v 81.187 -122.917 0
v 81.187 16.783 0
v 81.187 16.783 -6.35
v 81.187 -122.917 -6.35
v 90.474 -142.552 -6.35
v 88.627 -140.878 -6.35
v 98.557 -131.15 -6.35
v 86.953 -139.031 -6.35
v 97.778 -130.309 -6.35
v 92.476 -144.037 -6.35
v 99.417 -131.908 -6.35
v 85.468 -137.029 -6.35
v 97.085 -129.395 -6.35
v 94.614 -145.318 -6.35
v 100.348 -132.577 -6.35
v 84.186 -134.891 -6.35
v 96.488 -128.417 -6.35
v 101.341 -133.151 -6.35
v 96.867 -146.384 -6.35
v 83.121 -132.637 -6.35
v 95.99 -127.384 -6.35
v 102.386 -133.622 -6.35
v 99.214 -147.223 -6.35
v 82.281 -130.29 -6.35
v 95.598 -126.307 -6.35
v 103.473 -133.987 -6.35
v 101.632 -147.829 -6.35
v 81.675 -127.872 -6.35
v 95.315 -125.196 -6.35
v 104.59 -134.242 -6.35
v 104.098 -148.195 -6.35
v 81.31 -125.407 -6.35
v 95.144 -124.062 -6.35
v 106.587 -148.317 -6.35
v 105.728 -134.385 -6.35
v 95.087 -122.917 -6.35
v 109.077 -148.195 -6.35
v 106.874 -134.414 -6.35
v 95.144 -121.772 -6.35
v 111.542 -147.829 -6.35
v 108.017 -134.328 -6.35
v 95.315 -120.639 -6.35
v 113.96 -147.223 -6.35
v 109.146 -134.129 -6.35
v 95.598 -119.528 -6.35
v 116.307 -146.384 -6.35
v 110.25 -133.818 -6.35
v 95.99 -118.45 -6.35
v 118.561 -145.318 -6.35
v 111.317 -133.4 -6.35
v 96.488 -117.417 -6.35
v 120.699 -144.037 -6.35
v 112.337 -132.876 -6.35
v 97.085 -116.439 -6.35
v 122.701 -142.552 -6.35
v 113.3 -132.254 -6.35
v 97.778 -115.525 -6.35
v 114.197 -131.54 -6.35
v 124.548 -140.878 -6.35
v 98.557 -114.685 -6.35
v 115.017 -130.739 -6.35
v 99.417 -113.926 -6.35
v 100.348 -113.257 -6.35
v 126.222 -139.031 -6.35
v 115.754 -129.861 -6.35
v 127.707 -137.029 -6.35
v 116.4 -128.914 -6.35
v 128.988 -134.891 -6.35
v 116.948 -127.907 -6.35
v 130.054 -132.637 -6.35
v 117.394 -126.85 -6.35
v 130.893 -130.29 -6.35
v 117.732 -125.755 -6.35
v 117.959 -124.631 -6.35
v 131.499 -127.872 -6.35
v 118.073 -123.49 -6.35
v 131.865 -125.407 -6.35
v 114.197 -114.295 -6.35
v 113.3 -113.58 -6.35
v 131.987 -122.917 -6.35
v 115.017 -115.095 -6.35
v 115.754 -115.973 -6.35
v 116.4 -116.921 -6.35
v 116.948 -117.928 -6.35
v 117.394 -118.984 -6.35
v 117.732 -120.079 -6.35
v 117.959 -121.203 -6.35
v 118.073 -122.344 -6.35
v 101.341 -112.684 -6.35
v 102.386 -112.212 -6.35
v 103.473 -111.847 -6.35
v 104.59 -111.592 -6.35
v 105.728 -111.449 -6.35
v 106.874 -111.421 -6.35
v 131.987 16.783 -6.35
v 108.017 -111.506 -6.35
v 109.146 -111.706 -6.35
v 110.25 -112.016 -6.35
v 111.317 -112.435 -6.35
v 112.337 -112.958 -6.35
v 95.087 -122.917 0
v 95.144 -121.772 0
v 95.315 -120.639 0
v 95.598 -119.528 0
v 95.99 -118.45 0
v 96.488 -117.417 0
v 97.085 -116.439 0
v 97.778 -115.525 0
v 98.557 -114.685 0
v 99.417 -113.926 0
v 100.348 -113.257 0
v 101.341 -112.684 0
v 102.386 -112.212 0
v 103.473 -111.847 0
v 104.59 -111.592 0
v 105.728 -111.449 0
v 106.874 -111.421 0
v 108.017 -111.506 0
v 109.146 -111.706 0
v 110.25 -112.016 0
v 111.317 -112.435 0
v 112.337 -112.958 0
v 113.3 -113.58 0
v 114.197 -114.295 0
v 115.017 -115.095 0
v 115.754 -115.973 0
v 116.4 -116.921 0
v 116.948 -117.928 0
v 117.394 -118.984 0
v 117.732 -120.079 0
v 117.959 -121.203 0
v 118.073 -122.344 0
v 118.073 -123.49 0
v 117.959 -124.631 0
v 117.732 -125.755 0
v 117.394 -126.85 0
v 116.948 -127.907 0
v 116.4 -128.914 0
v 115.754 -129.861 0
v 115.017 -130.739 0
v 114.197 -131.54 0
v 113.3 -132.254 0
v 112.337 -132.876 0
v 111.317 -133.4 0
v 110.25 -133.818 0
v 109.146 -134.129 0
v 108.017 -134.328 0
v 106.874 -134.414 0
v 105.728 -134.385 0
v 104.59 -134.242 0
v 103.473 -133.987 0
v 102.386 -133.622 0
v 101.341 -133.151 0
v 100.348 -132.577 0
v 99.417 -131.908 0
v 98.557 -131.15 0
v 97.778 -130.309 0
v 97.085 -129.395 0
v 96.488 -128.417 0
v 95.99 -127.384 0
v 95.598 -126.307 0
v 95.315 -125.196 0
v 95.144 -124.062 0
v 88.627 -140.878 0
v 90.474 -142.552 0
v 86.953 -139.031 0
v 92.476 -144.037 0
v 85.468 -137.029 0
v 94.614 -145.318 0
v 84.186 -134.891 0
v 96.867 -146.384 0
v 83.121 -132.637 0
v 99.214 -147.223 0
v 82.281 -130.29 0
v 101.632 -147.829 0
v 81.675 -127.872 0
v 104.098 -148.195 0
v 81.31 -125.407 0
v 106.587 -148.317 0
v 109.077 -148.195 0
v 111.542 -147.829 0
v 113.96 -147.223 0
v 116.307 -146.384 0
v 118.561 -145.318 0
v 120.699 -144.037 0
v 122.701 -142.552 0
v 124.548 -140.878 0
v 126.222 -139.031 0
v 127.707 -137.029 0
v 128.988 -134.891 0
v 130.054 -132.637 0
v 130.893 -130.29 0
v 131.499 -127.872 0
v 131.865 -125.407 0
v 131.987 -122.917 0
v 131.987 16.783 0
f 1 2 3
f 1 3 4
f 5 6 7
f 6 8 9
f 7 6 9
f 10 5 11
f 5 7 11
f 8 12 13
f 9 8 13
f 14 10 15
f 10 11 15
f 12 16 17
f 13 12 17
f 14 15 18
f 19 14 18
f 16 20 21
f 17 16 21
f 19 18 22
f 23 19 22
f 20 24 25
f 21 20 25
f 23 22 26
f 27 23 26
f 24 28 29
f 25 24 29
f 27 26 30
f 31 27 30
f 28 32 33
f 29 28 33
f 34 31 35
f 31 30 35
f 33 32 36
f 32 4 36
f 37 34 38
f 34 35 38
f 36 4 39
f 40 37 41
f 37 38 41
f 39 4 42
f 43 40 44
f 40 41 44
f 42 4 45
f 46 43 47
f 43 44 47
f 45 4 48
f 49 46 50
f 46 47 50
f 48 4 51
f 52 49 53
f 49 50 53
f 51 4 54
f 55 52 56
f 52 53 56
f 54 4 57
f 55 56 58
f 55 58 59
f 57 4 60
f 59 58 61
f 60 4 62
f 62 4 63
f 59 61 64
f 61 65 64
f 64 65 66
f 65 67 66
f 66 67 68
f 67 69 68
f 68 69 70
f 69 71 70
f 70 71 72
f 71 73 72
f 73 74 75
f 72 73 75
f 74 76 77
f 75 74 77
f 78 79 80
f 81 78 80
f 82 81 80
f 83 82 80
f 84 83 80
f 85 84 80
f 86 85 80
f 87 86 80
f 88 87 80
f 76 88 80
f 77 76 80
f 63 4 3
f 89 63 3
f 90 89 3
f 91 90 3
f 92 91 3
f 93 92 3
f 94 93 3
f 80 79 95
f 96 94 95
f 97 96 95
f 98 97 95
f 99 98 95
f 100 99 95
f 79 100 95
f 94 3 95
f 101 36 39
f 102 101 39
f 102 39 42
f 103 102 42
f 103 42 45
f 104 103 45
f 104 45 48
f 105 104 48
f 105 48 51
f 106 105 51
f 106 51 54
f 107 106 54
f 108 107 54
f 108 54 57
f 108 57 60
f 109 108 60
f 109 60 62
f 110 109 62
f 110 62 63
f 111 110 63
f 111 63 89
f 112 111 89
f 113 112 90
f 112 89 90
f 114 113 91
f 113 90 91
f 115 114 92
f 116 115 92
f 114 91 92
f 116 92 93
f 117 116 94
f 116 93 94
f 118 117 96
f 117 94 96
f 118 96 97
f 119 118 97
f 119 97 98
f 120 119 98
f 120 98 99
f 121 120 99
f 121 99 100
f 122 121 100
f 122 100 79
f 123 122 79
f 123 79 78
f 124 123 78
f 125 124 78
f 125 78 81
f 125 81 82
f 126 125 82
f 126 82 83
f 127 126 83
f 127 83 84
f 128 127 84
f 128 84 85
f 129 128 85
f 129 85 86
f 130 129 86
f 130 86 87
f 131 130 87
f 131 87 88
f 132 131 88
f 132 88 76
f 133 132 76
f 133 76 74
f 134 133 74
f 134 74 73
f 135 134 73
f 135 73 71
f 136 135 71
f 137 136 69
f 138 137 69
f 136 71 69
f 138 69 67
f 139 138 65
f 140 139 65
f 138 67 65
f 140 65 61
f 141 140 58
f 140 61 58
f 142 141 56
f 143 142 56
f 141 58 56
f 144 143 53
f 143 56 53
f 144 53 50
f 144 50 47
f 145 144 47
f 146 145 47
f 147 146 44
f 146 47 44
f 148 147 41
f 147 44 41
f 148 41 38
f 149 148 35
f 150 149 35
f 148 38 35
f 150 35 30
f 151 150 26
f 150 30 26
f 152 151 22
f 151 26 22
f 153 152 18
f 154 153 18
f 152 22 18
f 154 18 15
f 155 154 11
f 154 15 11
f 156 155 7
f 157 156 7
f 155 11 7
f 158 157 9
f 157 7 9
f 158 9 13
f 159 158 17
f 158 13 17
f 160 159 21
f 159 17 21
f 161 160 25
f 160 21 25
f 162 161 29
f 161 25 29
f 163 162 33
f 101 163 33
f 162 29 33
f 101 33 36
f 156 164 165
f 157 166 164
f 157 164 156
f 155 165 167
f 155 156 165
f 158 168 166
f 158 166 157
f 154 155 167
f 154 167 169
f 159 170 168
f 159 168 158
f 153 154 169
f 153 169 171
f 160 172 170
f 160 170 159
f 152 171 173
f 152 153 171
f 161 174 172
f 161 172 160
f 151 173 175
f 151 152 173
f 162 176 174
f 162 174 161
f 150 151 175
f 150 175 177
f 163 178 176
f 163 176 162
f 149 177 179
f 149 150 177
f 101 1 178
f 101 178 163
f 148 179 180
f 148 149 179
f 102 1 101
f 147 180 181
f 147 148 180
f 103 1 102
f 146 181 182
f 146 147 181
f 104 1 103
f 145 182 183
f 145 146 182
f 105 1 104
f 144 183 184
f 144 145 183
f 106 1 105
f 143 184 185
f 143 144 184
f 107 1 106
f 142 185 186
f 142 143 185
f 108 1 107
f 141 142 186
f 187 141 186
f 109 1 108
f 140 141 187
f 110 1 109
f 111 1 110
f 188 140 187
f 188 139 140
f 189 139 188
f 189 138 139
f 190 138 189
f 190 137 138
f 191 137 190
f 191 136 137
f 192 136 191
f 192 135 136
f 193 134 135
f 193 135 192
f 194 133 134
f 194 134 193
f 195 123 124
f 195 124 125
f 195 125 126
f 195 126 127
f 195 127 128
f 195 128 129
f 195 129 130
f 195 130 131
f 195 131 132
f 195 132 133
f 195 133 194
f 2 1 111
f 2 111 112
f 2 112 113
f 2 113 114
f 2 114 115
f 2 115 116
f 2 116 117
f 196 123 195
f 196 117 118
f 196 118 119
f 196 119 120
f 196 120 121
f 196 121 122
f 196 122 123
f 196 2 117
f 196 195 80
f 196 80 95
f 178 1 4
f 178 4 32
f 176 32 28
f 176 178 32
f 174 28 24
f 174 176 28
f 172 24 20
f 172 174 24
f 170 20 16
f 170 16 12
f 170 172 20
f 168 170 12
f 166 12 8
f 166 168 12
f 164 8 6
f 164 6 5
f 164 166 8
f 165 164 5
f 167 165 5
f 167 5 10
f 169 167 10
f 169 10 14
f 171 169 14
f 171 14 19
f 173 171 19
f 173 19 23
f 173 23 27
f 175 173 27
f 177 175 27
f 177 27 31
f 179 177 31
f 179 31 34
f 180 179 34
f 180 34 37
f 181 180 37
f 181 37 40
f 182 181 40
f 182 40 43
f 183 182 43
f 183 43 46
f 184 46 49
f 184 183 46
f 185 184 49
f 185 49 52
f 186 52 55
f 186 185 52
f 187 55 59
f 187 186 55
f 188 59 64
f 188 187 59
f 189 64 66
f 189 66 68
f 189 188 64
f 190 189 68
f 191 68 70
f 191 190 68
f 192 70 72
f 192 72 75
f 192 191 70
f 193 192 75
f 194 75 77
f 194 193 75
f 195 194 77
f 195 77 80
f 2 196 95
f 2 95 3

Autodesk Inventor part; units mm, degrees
ref_plane "YZ Plane" through (0, 0, 0) normal (1, 0, 0) x (0, 1, 0)
ref_plane "XZ Plane" through (0, 0, 0) normal (0, 1, 0) x (-1, 0, 0)
ref_plane "XY Plane" through (0, 0, 0) normal (0, 0, 1) x (1, 0, 0)
sketch "Sketch1" plane through (0, 0, 0) normal (0, 0, 1) x (1, 0, 0)
  circle A0 centre (106.5872, -122.9172) radius 2.5 projected
  circle A1 centre (106.5872, -122.9172) radius 25.4
  line L0 (81.1872, -122.9172) -> (131.9872, -122.9172)
  line L1 (131.9872, -122.9172) -> (131.9872, 16.7828)
  line L2 (131.9872, 16.7828) -> (81.1872, 16.7828)
  line L3 (81.1872, 16.7828) -> (81.1872, -122.9172)
  circle A2 centre (106.5872, -122.9172) radius 11.5
  point P0 (0, 0)
  point P1 (106.5872, -148.3172)
  dimension "d0" = 50.8
  dimension "d1" = 139.7
  dimension "d4" = 23
  dimension "d9" = 50.8
extrude "Extrusion1" add sketch "Sketch1" against normal blind 6.35 contours L0 A0 | L0 A2 A0 | A0 L0 A2 | A2 L0 A1 | L0 A1 A2 | A1 L3 L2 L1 picked at (105.8251, -122.3305)
sketch "Sketch2" plane through (0, 0, -6.35) normal (0, 0, -1) x (-1, 0, 0)
  arc A0 (-131.9872, -122.9172) -> (-81.1872, -122.9172) centre (-106.5872, -122.9172) ccw projected
  circle A1 centre (-106.5872, -122.9172) radius 11.5
  point P0 (0, 0)
  dimension "d5" = 23
extrude "Extrusion2" cut sketch "Sketch2" against normal through all
sketch "Sketch3" plane through (0, 0, 0) normal (0, 0, 1) x (1, 0, 0)
  circle A0 centre (106.5872, -122.9172) radius 11.5 projected
  arc A1 (81.1872, -122.9172) -> (131.9872, -122.9172) centre (106.5872, -122.9172) ccw projected
  line L0 (131.9872, 16.7828) -> (131.9872, -122.9172) projected
  line L1 (81.1872, 16.7828) -> (131.9872, 16.7828) projected
  line L2 (81.1872, -122.9172) -> (81.1872, 16.7828) projected
  circle A2 centre (122.0872, -107.4172) radius 2 projected
  circle A3 centre (91.0872, -107.4172) radius 2 projected
  circle A4 centre (122.0872, -138.4172) radius 2 projected
  circle A5 centre (91.0872, -138.4172) radius 2 projected
  point P0 (0, 0)
properties part number "tiltColumnStepperSide"
